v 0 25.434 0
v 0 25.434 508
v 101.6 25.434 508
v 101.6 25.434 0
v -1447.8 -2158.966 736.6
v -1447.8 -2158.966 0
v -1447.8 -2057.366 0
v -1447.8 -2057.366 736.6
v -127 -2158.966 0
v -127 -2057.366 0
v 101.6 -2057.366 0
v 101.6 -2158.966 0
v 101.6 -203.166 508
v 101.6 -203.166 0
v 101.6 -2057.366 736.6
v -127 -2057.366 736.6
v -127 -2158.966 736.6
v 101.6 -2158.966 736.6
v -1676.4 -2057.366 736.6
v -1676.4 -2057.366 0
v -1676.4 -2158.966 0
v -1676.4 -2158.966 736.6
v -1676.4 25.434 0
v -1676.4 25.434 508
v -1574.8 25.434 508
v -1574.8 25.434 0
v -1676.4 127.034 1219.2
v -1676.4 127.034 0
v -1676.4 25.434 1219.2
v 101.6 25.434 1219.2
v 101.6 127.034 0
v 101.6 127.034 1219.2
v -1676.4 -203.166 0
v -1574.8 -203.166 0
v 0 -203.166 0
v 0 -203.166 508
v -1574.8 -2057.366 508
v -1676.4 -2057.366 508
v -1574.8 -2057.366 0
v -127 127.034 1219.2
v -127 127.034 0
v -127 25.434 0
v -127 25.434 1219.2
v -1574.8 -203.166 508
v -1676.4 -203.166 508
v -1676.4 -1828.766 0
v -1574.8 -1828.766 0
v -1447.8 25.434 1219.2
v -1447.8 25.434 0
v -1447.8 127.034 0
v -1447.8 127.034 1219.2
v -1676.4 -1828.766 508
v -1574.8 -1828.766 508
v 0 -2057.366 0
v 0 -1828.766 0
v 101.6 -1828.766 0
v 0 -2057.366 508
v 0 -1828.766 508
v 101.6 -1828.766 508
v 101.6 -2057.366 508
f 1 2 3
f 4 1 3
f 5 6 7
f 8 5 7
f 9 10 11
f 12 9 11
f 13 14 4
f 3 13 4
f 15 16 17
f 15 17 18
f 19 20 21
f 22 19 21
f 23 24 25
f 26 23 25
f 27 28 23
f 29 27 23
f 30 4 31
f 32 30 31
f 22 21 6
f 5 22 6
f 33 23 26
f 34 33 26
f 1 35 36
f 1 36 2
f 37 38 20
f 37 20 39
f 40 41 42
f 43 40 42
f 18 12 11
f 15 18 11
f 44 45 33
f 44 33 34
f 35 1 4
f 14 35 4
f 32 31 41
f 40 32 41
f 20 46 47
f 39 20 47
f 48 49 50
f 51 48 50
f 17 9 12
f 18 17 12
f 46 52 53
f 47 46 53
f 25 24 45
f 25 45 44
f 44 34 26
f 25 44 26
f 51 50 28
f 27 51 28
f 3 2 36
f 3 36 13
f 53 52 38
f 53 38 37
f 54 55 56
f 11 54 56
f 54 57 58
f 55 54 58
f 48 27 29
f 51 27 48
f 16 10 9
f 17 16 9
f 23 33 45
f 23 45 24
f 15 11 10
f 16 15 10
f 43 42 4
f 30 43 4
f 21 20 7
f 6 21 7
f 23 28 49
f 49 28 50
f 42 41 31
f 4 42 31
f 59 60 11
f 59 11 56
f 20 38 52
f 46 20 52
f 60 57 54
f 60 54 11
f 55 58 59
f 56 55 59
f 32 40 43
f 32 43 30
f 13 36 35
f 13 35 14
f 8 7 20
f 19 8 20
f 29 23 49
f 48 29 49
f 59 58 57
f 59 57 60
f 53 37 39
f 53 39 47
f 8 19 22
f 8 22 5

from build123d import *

# Parameters (mm, degrees)
F1_DEPTH = 736.6
F2_DEPTH = 1219.2
F0_W     = 101.6
F0_H     = 228.6
F3_DEPTH = 508


with BuildPart() as f1:
    # F0 (on Top) → F1 (new body)
    with BuildSketch(Plane.XY):
        Polygon((-1447.8, -2158.965689), (-1447.8, -2057.365689), (-1574.8, -2057.365689), (-1676.4, -2057.365689), (-1676.4, -2158.965689), align=None)
        Polygon((101.6, -2158.965689), (101.6, -2057.365689), (0, -2057.365689), (-127, -2057.365689), (-127, -2158.965689), align=None)
    extrude(amount=F1_DEPTH)


with BuildPart() as f2:
    # F0 (on Top) → F2 (new body)
    with BuildSketch(Plane.XY):
        Polygon((-1574.8, 25.434311), (-1447.8, 25.434311), (-1447.8, 127.034311), (-1676.4, 127.034311), (-1676.4, 25.434311), align=None)
        Polygon((-127, 127.034311), (-127, 25.434311), (0, 25.434311), (101.6, 25.434311), (101.6, 127.034311), align=None)
    extrude(amount=F2_DEPTH)


with BuildPart() as f3:
    # F0 (on Top) → F3 (new body)
    with BuildSketch(Plane.XY):
        with Locations((-1625.6, -88.865689)):
            Rectangle(F0_W, F0_H)
        with Locations((50.8, -88.865689)):
            Rectangle(F0_W, F0_H)
        with Locations((-1625.6, -1943.065689)):
            Rectangle(F0_W, F0_H)
        with Locations((50.8, -1943.065689)):
            Rectangle(F0_W, F0_H)
    extrude(amount=F3_DEPTH)


solid = Compound([f1.part, f2.part, f3.part])
